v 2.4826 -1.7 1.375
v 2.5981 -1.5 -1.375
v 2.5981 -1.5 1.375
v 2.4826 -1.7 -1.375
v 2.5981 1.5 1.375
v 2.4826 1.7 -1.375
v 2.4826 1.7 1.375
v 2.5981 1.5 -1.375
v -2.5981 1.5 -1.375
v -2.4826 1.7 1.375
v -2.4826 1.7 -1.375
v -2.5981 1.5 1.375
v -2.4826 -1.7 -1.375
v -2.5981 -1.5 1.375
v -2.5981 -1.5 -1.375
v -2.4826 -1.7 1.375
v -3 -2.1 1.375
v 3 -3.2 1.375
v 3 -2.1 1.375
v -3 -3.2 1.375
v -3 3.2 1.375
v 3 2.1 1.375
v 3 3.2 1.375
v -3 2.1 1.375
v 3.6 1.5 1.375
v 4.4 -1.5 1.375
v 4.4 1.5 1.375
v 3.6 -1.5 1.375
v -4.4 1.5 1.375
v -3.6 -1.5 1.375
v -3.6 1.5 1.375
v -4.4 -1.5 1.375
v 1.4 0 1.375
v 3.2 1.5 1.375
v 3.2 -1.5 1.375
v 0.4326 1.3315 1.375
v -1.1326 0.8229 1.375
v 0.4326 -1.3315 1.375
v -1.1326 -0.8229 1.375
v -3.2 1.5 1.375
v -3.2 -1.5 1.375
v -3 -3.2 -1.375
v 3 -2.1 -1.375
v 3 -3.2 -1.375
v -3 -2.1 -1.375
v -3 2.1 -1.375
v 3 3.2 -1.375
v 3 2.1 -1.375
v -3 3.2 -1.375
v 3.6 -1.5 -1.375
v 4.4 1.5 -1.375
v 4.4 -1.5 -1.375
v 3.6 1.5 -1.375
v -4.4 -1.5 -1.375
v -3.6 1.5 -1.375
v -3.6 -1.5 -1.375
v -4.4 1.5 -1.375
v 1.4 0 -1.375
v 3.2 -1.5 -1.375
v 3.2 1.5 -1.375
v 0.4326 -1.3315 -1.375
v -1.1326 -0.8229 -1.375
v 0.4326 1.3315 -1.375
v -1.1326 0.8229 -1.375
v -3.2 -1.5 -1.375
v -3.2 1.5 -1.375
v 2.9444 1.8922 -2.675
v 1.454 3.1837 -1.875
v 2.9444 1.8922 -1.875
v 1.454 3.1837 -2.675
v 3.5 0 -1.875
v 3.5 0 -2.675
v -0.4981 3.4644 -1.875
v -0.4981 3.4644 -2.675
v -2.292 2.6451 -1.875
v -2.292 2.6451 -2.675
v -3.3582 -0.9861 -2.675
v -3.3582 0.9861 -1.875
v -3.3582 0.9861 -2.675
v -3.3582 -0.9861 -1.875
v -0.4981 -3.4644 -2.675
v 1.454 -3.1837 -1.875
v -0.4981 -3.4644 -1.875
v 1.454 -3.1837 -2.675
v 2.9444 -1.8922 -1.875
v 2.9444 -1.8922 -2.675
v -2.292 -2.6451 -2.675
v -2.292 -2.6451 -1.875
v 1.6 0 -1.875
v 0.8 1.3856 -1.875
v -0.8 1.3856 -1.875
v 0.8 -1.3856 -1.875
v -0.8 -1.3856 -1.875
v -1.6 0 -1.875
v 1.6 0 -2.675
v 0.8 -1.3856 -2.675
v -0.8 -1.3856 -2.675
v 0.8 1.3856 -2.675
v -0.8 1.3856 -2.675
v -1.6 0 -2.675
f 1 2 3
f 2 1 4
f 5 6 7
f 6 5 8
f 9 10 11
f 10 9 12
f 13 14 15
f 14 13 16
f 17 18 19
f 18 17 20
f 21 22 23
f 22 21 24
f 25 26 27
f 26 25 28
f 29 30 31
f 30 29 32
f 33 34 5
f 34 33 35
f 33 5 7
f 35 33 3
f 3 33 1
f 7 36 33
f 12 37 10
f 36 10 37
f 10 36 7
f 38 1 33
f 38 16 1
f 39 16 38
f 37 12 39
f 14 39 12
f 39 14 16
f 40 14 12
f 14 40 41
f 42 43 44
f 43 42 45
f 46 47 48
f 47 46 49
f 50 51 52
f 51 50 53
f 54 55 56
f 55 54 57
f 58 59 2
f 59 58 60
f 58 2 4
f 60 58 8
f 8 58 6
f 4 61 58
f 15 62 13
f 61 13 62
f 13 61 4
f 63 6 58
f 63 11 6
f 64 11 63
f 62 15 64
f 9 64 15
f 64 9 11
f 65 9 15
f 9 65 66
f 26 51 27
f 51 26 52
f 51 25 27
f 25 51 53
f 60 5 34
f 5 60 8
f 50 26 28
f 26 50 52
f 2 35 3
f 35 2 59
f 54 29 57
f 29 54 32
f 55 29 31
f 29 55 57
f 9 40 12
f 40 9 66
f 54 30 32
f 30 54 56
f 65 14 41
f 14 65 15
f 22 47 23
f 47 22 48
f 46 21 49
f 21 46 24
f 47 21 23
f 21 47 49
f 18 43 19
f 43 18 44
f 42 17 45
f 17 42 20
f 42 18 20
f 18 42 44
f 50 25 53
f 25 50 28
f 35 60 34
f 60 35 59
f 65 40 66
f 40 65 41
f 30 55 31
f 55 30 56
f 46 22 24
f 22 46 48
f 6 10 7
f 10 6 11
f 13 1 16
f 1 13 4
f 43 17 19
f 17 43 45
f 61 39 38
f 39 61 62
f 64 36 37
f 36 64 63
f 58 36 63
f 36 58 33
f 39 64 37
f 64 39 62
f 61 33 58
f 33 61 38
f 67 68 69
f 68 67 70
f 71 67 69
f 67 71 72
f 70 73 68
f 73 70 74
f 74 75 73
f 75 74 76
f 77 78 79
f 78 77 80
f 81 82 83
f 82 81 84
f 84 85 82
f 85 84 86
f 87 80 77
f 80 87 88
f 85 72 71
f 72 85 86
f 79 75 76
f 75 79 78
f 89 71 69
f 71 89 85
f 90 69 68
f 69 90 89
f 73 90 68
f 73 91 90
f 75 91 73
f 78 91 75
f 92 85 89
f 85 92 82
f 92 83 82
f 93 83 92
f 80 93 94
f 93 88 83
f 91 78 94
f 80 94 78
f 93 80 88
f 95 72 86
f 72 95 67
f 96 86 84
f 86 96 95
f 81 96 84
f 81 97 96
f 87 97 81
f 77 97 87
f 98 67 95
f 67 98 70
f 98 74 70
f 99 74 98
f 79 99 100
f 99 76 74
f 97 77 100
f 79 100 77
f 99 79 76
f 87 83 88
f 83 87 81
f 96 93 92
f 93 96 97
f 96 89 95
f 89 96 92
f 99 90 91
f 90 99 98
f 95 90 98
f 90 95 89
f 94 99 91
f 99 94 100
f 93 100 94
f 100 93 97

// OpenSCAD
// Parameters
screw_thread_diameter = 3; //[1.5:6:0.1]
across_flats = 6; //[3:12:0.1]
thickness = 2.75; //[1.4:5.5:0.05]
thread_pitch = 0.5; //[0.25:1:0.05]
t_slot_interface_width = 6.2; //[4:12:0.1]
t_slot_interface_height = 3.2; //[2:8:0.1]
t_slot_interface_clearance = 0.2; //[0:0.6:0.05]
anti_rotation_tab_width = 1.2; //[0.6:2.4:0.05]
anti_rotation_tab_height = 0.6; //[0.3:1.2:0.05]
edge_chamfer = 0.2; //[0:0.8:0.05]
corner_radius = 0.2; //[0:0.8:0.05]
hole_clearance = 0.2; //[0:0.6:0.05]
hole_diameter = 2.8; //[2.4:3.4:0.05]
overlap = 0.8; //[0.5:2:0.1]
washer_outer_diameter = 7; //[4:14:0.1]
washer_thickness = 0.8; //[0.4:2:0.05]
assembly_gap = 0.5; //[0:3:0.1]

// Nut and Washer - complete geometry
module nut_and_washer() {

  // Derived sizes
  hex_r = across_flats/(2*cos(30));                 // circumscribed radius for $fn=6
  tab_x_len = anti_rotation_tab_width*2;
  tab_y_len = anti_rotation_tab_height*2;
  tab_y_span = t_slot_interface_height - t_slot_interface_clearance;
  tab_x_span = t_slot_interface_width  - t_slot_interface_clearance;

  // Requested: ensure real overlap between parts (1-2mm)
  attach_ov = min(2, max(1, overlap));

  // --- Attachment positions (recalculated to GUARANTEE intersection) ---
  // Use the hex's *inradius* (across-flats/2) as the contact plane for blocks.
  // This ensures the blocks intersect the hex even at the flats (not just near vertices).
  hex_inr = across_flats/2;

  // Side blocks: inner face at x = +hex_inr - attach_ov  => guaranteed overlap
  side_x = (hex_inr - attach_ov) + tab_x_len/2;

  // Top/bottom blocks: inner face at y = +hex_inr - attach_ov => guaranteed overlap
  cap_y  = (hex_inr - attach_ov) + tab_y_len/2;

  // Build as ONE connected solid (nut body + all flanges) then subtract hole/chamfers
  color("DimGray")
  difference() {
    union() {
      // Hexagonal body
      cylinder(r=hex_r, h=thickness, center=true, $fn=6);

      // Left/right rectangular blocks (ATTACHED with overlap)
      translate([ side_x, 0, 0])
        cube([tab_x_len, tab_y_span, thickness], center=true);
      translate([-side_x, 0, 0])
        cube([tab_x_len, tab_y_span, thickness], center=true);

      // Top/bottom rectangular blocks (ATTACHED with overlap)
      translate([0,  cap_y, 0])
        cube([tab_x_span, tab_y_len, thickness], center=true);
      translate([0, -cap_y, 0])
        cube([tab_x_span, tab_y_len, thickness], center=true);
    }

    // Lead-in chamfers (subtractive) - keep them, but ensure cutters fully span the body
    translate([t_slot_interface_width/2 - edge_chamfer + attach_ov/2, 0, 0])
      cube([edge_chamfer*2, t_slot_interface_height*2, thickness + attach_ov*4], center=true);
    translate([-(t_slot_interface_width/2 - edge_chamfer + attach_ov/2), 0, 0])
      cube([edge_chamfer*2, t_slot_interface_height*2, thickness + attach_ov*4], center=true);
    translate([0, t_slot_interface_height/2 - edge_chamfer + attach_ov/2, 0])
      cube([t_slot_interface_width*2, edge_chamfer*2, thickness + attach_ov*4], center=true);
    translate([0, -(t_slot_interface_height/2 - edge_chamfer + attach_ov/2), 0])
      cube([t_slot_interface_width*2, edge_chamfer*2, thickness + attach_ov*4], center=true);

    // Threaded hole (modeled as clearance cylinder)
    cylinder(r=hole_diameter/2, h=thickness + attach_ov*4, center=true);
  }

  // Washer: keep as separate part by default (not part of "nut" solid)
  // (Structural issues listed are about the flange blocks; washer is not required to be fused.)
  washer_fuse = false;

  washer_z = -(thickness/2 + assembly_gap + washer_thickness/2);
  washer_z_fused = -(thickness/2 + washer_thickness/2 - attach_ov);

  color("Silver")
  if (washer_fuse) {
    // Fused washer (single solid with nut)
    difference() {
      translate([0, 0, washer_z_fused])
        cylinder(r=washer_outer_diameter/2, h=washer_thickness, center=true);
      translate([0, 0, washer_z_fused])
        cylinder(r=(screw_thread_diameter + hole_clearance)/2, h=washer_thickness + attach_ov*4, center=true);
    }
  } else {
    // Non-fused washer (assembly gap preserved)
    difference() {
      translate([0, 0, washer_z])
        cylinder(r=washer_outer_diameter/2, h=washer_thickness, center=true);
      translate([0, 0, washer_z])
        cylinder(r=(screw_thread_diameter + hole_clearance)/2, h=washer_thickness + attach_ov*4, center=true);
    }
  }
}

// Assembly
module assembly() {
  nut_and_washer();
}

assembly();
